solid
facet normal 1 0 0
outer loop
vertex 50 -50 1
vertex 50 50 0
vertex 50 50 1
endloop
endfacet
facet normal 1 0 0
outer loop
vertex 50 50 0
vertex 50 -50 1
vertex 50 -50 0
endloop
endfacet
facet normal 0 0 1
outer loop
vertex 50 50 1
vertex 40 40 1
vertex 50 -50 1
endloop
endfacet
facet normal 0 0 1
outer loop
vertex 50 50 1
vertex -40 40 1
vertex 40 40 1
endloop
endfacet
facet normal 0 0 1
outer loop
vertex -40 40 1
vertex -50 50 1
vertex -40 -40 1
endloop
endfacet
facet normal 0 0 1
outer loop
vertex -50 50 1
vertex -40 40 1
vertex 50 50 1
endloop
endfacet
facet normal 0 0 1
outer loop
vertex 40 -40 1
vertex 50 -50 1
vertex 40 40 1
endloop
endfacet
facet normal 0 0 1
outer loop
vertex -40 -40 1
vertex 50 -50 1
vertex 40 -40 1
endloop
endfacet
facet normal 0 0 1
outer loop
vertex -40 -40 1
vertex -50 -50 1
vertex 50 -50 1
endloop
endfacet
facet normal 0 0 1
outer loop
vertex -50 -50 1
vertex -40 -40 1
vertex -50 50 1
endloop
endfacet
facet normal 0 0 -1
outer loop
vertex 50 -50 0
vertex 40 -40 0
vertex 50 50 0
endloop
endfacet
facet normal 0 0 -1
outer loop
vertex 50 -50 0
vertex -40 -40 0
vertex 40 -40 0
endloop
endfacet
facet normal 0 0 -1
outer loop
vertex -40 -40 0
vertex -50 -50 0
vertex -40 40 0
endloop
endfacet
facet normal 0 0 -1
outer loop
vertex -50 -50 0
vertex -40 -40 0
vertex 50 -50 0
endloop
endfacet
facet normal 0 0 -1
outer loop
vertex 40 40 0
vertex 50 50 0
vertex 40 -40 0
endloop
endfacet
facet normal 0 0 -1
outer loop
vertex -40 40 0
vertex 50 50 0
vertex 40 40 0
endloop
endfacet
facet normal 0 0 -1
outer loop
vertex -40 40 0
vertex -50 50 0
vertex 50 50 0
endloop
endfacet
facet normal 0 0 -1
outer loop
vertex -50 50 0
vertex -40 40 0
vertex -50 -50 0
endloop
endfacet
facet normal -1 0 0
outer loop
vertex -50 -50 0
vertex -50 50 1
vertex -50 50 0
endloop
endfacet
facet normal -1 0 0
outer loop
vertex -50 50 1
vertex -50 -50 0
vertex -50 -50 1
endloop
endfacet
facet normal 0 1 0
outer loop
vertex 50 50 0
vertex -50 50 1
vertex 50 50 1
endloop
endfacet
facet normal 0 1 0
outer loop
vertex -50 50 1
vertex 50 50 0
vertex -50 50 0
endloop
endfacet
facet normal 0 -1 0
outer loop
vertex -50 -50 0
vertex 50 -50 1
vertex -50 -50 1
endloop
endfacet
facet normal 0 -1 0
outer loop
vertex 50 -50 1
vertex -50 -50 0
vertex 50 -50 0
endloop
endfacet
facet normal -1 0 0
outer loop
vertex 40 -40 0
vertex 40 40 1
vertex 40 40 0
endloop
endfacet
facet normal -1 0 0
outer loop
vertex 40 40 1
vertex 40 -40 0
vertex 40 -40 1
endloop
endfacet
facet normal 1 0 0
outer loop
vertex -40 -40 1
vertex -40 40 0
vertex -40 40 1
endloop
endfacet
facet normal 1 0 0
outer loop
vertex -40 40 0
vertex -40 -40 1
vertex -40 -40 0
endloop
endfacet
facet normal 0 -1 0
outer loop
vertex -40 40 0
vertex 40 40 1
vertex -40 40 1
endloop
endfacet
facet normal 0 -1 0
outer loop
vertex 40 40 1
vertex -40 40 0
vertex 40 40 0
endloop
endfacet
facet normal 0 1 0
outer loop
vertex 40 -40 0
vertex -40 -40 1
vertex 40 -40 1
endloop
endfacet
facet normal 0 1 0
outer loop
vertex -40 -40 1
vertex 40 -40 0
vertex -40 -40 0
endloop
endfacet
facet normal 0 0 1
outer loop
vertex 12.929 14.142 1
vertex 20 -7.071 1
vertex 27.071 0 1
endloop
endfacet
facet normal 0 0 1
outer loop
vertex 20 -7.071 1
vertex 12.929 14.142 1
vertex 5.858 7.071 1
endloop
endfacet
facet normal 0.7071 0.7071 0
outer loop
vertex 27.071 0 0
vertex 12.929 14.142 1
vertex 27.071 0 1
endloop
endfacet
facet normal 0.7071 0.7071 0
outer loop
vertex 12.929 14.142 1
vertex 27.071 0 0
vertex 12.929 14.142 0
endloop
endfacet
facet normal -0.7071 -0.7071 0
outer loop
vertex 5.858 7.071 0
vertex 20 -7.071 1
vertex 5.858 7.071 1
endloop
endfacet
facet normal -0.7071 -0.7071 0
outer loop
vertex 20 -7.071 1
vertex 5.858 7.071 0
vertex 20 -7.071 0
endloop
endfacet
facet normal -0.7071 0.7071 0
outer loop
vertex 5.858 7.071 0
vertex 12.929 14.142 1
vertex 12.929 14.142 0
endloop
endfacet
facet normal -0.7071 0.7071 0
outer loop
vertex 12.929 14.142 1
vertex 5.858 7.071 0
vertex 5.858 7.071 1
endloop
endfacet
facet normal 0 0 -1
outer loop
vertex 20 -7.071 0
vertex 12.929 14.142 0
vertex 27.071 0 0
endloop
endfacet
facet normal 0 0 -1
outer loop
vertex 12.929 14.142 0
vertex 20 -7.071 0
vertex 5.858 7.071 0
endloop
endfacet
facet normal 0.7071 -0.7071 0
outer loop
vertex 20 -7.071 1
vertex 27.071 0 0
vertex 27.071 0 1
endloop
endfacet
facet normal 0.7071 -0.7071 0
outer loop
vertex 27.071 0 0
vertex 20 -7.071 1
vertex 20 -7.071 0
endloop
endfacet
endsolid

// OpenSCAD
module frame_with_hook() {
    difference() {
        // Outer frame
        union() {
            // Main rectangular frame
            translate([-50, -50, 0])
                cube([100, 100, 1]);
            // Thicker end block
            translate([-50, 40, 0])
                cube([100, 10, 1]);
        }
        // Central rectangular through-opening
        translate([-40, -40, -1])
            cube([80, 80, 3]);
    }
    
    // Stepped, angled cantilever tab
    translate([20, 0, 0]) {
        rotate([0, 0, 45]) {
            translate([-5, -5, 0])
                cube([10, 20, 1]);
        }
    }
}

frame_with_hook();
